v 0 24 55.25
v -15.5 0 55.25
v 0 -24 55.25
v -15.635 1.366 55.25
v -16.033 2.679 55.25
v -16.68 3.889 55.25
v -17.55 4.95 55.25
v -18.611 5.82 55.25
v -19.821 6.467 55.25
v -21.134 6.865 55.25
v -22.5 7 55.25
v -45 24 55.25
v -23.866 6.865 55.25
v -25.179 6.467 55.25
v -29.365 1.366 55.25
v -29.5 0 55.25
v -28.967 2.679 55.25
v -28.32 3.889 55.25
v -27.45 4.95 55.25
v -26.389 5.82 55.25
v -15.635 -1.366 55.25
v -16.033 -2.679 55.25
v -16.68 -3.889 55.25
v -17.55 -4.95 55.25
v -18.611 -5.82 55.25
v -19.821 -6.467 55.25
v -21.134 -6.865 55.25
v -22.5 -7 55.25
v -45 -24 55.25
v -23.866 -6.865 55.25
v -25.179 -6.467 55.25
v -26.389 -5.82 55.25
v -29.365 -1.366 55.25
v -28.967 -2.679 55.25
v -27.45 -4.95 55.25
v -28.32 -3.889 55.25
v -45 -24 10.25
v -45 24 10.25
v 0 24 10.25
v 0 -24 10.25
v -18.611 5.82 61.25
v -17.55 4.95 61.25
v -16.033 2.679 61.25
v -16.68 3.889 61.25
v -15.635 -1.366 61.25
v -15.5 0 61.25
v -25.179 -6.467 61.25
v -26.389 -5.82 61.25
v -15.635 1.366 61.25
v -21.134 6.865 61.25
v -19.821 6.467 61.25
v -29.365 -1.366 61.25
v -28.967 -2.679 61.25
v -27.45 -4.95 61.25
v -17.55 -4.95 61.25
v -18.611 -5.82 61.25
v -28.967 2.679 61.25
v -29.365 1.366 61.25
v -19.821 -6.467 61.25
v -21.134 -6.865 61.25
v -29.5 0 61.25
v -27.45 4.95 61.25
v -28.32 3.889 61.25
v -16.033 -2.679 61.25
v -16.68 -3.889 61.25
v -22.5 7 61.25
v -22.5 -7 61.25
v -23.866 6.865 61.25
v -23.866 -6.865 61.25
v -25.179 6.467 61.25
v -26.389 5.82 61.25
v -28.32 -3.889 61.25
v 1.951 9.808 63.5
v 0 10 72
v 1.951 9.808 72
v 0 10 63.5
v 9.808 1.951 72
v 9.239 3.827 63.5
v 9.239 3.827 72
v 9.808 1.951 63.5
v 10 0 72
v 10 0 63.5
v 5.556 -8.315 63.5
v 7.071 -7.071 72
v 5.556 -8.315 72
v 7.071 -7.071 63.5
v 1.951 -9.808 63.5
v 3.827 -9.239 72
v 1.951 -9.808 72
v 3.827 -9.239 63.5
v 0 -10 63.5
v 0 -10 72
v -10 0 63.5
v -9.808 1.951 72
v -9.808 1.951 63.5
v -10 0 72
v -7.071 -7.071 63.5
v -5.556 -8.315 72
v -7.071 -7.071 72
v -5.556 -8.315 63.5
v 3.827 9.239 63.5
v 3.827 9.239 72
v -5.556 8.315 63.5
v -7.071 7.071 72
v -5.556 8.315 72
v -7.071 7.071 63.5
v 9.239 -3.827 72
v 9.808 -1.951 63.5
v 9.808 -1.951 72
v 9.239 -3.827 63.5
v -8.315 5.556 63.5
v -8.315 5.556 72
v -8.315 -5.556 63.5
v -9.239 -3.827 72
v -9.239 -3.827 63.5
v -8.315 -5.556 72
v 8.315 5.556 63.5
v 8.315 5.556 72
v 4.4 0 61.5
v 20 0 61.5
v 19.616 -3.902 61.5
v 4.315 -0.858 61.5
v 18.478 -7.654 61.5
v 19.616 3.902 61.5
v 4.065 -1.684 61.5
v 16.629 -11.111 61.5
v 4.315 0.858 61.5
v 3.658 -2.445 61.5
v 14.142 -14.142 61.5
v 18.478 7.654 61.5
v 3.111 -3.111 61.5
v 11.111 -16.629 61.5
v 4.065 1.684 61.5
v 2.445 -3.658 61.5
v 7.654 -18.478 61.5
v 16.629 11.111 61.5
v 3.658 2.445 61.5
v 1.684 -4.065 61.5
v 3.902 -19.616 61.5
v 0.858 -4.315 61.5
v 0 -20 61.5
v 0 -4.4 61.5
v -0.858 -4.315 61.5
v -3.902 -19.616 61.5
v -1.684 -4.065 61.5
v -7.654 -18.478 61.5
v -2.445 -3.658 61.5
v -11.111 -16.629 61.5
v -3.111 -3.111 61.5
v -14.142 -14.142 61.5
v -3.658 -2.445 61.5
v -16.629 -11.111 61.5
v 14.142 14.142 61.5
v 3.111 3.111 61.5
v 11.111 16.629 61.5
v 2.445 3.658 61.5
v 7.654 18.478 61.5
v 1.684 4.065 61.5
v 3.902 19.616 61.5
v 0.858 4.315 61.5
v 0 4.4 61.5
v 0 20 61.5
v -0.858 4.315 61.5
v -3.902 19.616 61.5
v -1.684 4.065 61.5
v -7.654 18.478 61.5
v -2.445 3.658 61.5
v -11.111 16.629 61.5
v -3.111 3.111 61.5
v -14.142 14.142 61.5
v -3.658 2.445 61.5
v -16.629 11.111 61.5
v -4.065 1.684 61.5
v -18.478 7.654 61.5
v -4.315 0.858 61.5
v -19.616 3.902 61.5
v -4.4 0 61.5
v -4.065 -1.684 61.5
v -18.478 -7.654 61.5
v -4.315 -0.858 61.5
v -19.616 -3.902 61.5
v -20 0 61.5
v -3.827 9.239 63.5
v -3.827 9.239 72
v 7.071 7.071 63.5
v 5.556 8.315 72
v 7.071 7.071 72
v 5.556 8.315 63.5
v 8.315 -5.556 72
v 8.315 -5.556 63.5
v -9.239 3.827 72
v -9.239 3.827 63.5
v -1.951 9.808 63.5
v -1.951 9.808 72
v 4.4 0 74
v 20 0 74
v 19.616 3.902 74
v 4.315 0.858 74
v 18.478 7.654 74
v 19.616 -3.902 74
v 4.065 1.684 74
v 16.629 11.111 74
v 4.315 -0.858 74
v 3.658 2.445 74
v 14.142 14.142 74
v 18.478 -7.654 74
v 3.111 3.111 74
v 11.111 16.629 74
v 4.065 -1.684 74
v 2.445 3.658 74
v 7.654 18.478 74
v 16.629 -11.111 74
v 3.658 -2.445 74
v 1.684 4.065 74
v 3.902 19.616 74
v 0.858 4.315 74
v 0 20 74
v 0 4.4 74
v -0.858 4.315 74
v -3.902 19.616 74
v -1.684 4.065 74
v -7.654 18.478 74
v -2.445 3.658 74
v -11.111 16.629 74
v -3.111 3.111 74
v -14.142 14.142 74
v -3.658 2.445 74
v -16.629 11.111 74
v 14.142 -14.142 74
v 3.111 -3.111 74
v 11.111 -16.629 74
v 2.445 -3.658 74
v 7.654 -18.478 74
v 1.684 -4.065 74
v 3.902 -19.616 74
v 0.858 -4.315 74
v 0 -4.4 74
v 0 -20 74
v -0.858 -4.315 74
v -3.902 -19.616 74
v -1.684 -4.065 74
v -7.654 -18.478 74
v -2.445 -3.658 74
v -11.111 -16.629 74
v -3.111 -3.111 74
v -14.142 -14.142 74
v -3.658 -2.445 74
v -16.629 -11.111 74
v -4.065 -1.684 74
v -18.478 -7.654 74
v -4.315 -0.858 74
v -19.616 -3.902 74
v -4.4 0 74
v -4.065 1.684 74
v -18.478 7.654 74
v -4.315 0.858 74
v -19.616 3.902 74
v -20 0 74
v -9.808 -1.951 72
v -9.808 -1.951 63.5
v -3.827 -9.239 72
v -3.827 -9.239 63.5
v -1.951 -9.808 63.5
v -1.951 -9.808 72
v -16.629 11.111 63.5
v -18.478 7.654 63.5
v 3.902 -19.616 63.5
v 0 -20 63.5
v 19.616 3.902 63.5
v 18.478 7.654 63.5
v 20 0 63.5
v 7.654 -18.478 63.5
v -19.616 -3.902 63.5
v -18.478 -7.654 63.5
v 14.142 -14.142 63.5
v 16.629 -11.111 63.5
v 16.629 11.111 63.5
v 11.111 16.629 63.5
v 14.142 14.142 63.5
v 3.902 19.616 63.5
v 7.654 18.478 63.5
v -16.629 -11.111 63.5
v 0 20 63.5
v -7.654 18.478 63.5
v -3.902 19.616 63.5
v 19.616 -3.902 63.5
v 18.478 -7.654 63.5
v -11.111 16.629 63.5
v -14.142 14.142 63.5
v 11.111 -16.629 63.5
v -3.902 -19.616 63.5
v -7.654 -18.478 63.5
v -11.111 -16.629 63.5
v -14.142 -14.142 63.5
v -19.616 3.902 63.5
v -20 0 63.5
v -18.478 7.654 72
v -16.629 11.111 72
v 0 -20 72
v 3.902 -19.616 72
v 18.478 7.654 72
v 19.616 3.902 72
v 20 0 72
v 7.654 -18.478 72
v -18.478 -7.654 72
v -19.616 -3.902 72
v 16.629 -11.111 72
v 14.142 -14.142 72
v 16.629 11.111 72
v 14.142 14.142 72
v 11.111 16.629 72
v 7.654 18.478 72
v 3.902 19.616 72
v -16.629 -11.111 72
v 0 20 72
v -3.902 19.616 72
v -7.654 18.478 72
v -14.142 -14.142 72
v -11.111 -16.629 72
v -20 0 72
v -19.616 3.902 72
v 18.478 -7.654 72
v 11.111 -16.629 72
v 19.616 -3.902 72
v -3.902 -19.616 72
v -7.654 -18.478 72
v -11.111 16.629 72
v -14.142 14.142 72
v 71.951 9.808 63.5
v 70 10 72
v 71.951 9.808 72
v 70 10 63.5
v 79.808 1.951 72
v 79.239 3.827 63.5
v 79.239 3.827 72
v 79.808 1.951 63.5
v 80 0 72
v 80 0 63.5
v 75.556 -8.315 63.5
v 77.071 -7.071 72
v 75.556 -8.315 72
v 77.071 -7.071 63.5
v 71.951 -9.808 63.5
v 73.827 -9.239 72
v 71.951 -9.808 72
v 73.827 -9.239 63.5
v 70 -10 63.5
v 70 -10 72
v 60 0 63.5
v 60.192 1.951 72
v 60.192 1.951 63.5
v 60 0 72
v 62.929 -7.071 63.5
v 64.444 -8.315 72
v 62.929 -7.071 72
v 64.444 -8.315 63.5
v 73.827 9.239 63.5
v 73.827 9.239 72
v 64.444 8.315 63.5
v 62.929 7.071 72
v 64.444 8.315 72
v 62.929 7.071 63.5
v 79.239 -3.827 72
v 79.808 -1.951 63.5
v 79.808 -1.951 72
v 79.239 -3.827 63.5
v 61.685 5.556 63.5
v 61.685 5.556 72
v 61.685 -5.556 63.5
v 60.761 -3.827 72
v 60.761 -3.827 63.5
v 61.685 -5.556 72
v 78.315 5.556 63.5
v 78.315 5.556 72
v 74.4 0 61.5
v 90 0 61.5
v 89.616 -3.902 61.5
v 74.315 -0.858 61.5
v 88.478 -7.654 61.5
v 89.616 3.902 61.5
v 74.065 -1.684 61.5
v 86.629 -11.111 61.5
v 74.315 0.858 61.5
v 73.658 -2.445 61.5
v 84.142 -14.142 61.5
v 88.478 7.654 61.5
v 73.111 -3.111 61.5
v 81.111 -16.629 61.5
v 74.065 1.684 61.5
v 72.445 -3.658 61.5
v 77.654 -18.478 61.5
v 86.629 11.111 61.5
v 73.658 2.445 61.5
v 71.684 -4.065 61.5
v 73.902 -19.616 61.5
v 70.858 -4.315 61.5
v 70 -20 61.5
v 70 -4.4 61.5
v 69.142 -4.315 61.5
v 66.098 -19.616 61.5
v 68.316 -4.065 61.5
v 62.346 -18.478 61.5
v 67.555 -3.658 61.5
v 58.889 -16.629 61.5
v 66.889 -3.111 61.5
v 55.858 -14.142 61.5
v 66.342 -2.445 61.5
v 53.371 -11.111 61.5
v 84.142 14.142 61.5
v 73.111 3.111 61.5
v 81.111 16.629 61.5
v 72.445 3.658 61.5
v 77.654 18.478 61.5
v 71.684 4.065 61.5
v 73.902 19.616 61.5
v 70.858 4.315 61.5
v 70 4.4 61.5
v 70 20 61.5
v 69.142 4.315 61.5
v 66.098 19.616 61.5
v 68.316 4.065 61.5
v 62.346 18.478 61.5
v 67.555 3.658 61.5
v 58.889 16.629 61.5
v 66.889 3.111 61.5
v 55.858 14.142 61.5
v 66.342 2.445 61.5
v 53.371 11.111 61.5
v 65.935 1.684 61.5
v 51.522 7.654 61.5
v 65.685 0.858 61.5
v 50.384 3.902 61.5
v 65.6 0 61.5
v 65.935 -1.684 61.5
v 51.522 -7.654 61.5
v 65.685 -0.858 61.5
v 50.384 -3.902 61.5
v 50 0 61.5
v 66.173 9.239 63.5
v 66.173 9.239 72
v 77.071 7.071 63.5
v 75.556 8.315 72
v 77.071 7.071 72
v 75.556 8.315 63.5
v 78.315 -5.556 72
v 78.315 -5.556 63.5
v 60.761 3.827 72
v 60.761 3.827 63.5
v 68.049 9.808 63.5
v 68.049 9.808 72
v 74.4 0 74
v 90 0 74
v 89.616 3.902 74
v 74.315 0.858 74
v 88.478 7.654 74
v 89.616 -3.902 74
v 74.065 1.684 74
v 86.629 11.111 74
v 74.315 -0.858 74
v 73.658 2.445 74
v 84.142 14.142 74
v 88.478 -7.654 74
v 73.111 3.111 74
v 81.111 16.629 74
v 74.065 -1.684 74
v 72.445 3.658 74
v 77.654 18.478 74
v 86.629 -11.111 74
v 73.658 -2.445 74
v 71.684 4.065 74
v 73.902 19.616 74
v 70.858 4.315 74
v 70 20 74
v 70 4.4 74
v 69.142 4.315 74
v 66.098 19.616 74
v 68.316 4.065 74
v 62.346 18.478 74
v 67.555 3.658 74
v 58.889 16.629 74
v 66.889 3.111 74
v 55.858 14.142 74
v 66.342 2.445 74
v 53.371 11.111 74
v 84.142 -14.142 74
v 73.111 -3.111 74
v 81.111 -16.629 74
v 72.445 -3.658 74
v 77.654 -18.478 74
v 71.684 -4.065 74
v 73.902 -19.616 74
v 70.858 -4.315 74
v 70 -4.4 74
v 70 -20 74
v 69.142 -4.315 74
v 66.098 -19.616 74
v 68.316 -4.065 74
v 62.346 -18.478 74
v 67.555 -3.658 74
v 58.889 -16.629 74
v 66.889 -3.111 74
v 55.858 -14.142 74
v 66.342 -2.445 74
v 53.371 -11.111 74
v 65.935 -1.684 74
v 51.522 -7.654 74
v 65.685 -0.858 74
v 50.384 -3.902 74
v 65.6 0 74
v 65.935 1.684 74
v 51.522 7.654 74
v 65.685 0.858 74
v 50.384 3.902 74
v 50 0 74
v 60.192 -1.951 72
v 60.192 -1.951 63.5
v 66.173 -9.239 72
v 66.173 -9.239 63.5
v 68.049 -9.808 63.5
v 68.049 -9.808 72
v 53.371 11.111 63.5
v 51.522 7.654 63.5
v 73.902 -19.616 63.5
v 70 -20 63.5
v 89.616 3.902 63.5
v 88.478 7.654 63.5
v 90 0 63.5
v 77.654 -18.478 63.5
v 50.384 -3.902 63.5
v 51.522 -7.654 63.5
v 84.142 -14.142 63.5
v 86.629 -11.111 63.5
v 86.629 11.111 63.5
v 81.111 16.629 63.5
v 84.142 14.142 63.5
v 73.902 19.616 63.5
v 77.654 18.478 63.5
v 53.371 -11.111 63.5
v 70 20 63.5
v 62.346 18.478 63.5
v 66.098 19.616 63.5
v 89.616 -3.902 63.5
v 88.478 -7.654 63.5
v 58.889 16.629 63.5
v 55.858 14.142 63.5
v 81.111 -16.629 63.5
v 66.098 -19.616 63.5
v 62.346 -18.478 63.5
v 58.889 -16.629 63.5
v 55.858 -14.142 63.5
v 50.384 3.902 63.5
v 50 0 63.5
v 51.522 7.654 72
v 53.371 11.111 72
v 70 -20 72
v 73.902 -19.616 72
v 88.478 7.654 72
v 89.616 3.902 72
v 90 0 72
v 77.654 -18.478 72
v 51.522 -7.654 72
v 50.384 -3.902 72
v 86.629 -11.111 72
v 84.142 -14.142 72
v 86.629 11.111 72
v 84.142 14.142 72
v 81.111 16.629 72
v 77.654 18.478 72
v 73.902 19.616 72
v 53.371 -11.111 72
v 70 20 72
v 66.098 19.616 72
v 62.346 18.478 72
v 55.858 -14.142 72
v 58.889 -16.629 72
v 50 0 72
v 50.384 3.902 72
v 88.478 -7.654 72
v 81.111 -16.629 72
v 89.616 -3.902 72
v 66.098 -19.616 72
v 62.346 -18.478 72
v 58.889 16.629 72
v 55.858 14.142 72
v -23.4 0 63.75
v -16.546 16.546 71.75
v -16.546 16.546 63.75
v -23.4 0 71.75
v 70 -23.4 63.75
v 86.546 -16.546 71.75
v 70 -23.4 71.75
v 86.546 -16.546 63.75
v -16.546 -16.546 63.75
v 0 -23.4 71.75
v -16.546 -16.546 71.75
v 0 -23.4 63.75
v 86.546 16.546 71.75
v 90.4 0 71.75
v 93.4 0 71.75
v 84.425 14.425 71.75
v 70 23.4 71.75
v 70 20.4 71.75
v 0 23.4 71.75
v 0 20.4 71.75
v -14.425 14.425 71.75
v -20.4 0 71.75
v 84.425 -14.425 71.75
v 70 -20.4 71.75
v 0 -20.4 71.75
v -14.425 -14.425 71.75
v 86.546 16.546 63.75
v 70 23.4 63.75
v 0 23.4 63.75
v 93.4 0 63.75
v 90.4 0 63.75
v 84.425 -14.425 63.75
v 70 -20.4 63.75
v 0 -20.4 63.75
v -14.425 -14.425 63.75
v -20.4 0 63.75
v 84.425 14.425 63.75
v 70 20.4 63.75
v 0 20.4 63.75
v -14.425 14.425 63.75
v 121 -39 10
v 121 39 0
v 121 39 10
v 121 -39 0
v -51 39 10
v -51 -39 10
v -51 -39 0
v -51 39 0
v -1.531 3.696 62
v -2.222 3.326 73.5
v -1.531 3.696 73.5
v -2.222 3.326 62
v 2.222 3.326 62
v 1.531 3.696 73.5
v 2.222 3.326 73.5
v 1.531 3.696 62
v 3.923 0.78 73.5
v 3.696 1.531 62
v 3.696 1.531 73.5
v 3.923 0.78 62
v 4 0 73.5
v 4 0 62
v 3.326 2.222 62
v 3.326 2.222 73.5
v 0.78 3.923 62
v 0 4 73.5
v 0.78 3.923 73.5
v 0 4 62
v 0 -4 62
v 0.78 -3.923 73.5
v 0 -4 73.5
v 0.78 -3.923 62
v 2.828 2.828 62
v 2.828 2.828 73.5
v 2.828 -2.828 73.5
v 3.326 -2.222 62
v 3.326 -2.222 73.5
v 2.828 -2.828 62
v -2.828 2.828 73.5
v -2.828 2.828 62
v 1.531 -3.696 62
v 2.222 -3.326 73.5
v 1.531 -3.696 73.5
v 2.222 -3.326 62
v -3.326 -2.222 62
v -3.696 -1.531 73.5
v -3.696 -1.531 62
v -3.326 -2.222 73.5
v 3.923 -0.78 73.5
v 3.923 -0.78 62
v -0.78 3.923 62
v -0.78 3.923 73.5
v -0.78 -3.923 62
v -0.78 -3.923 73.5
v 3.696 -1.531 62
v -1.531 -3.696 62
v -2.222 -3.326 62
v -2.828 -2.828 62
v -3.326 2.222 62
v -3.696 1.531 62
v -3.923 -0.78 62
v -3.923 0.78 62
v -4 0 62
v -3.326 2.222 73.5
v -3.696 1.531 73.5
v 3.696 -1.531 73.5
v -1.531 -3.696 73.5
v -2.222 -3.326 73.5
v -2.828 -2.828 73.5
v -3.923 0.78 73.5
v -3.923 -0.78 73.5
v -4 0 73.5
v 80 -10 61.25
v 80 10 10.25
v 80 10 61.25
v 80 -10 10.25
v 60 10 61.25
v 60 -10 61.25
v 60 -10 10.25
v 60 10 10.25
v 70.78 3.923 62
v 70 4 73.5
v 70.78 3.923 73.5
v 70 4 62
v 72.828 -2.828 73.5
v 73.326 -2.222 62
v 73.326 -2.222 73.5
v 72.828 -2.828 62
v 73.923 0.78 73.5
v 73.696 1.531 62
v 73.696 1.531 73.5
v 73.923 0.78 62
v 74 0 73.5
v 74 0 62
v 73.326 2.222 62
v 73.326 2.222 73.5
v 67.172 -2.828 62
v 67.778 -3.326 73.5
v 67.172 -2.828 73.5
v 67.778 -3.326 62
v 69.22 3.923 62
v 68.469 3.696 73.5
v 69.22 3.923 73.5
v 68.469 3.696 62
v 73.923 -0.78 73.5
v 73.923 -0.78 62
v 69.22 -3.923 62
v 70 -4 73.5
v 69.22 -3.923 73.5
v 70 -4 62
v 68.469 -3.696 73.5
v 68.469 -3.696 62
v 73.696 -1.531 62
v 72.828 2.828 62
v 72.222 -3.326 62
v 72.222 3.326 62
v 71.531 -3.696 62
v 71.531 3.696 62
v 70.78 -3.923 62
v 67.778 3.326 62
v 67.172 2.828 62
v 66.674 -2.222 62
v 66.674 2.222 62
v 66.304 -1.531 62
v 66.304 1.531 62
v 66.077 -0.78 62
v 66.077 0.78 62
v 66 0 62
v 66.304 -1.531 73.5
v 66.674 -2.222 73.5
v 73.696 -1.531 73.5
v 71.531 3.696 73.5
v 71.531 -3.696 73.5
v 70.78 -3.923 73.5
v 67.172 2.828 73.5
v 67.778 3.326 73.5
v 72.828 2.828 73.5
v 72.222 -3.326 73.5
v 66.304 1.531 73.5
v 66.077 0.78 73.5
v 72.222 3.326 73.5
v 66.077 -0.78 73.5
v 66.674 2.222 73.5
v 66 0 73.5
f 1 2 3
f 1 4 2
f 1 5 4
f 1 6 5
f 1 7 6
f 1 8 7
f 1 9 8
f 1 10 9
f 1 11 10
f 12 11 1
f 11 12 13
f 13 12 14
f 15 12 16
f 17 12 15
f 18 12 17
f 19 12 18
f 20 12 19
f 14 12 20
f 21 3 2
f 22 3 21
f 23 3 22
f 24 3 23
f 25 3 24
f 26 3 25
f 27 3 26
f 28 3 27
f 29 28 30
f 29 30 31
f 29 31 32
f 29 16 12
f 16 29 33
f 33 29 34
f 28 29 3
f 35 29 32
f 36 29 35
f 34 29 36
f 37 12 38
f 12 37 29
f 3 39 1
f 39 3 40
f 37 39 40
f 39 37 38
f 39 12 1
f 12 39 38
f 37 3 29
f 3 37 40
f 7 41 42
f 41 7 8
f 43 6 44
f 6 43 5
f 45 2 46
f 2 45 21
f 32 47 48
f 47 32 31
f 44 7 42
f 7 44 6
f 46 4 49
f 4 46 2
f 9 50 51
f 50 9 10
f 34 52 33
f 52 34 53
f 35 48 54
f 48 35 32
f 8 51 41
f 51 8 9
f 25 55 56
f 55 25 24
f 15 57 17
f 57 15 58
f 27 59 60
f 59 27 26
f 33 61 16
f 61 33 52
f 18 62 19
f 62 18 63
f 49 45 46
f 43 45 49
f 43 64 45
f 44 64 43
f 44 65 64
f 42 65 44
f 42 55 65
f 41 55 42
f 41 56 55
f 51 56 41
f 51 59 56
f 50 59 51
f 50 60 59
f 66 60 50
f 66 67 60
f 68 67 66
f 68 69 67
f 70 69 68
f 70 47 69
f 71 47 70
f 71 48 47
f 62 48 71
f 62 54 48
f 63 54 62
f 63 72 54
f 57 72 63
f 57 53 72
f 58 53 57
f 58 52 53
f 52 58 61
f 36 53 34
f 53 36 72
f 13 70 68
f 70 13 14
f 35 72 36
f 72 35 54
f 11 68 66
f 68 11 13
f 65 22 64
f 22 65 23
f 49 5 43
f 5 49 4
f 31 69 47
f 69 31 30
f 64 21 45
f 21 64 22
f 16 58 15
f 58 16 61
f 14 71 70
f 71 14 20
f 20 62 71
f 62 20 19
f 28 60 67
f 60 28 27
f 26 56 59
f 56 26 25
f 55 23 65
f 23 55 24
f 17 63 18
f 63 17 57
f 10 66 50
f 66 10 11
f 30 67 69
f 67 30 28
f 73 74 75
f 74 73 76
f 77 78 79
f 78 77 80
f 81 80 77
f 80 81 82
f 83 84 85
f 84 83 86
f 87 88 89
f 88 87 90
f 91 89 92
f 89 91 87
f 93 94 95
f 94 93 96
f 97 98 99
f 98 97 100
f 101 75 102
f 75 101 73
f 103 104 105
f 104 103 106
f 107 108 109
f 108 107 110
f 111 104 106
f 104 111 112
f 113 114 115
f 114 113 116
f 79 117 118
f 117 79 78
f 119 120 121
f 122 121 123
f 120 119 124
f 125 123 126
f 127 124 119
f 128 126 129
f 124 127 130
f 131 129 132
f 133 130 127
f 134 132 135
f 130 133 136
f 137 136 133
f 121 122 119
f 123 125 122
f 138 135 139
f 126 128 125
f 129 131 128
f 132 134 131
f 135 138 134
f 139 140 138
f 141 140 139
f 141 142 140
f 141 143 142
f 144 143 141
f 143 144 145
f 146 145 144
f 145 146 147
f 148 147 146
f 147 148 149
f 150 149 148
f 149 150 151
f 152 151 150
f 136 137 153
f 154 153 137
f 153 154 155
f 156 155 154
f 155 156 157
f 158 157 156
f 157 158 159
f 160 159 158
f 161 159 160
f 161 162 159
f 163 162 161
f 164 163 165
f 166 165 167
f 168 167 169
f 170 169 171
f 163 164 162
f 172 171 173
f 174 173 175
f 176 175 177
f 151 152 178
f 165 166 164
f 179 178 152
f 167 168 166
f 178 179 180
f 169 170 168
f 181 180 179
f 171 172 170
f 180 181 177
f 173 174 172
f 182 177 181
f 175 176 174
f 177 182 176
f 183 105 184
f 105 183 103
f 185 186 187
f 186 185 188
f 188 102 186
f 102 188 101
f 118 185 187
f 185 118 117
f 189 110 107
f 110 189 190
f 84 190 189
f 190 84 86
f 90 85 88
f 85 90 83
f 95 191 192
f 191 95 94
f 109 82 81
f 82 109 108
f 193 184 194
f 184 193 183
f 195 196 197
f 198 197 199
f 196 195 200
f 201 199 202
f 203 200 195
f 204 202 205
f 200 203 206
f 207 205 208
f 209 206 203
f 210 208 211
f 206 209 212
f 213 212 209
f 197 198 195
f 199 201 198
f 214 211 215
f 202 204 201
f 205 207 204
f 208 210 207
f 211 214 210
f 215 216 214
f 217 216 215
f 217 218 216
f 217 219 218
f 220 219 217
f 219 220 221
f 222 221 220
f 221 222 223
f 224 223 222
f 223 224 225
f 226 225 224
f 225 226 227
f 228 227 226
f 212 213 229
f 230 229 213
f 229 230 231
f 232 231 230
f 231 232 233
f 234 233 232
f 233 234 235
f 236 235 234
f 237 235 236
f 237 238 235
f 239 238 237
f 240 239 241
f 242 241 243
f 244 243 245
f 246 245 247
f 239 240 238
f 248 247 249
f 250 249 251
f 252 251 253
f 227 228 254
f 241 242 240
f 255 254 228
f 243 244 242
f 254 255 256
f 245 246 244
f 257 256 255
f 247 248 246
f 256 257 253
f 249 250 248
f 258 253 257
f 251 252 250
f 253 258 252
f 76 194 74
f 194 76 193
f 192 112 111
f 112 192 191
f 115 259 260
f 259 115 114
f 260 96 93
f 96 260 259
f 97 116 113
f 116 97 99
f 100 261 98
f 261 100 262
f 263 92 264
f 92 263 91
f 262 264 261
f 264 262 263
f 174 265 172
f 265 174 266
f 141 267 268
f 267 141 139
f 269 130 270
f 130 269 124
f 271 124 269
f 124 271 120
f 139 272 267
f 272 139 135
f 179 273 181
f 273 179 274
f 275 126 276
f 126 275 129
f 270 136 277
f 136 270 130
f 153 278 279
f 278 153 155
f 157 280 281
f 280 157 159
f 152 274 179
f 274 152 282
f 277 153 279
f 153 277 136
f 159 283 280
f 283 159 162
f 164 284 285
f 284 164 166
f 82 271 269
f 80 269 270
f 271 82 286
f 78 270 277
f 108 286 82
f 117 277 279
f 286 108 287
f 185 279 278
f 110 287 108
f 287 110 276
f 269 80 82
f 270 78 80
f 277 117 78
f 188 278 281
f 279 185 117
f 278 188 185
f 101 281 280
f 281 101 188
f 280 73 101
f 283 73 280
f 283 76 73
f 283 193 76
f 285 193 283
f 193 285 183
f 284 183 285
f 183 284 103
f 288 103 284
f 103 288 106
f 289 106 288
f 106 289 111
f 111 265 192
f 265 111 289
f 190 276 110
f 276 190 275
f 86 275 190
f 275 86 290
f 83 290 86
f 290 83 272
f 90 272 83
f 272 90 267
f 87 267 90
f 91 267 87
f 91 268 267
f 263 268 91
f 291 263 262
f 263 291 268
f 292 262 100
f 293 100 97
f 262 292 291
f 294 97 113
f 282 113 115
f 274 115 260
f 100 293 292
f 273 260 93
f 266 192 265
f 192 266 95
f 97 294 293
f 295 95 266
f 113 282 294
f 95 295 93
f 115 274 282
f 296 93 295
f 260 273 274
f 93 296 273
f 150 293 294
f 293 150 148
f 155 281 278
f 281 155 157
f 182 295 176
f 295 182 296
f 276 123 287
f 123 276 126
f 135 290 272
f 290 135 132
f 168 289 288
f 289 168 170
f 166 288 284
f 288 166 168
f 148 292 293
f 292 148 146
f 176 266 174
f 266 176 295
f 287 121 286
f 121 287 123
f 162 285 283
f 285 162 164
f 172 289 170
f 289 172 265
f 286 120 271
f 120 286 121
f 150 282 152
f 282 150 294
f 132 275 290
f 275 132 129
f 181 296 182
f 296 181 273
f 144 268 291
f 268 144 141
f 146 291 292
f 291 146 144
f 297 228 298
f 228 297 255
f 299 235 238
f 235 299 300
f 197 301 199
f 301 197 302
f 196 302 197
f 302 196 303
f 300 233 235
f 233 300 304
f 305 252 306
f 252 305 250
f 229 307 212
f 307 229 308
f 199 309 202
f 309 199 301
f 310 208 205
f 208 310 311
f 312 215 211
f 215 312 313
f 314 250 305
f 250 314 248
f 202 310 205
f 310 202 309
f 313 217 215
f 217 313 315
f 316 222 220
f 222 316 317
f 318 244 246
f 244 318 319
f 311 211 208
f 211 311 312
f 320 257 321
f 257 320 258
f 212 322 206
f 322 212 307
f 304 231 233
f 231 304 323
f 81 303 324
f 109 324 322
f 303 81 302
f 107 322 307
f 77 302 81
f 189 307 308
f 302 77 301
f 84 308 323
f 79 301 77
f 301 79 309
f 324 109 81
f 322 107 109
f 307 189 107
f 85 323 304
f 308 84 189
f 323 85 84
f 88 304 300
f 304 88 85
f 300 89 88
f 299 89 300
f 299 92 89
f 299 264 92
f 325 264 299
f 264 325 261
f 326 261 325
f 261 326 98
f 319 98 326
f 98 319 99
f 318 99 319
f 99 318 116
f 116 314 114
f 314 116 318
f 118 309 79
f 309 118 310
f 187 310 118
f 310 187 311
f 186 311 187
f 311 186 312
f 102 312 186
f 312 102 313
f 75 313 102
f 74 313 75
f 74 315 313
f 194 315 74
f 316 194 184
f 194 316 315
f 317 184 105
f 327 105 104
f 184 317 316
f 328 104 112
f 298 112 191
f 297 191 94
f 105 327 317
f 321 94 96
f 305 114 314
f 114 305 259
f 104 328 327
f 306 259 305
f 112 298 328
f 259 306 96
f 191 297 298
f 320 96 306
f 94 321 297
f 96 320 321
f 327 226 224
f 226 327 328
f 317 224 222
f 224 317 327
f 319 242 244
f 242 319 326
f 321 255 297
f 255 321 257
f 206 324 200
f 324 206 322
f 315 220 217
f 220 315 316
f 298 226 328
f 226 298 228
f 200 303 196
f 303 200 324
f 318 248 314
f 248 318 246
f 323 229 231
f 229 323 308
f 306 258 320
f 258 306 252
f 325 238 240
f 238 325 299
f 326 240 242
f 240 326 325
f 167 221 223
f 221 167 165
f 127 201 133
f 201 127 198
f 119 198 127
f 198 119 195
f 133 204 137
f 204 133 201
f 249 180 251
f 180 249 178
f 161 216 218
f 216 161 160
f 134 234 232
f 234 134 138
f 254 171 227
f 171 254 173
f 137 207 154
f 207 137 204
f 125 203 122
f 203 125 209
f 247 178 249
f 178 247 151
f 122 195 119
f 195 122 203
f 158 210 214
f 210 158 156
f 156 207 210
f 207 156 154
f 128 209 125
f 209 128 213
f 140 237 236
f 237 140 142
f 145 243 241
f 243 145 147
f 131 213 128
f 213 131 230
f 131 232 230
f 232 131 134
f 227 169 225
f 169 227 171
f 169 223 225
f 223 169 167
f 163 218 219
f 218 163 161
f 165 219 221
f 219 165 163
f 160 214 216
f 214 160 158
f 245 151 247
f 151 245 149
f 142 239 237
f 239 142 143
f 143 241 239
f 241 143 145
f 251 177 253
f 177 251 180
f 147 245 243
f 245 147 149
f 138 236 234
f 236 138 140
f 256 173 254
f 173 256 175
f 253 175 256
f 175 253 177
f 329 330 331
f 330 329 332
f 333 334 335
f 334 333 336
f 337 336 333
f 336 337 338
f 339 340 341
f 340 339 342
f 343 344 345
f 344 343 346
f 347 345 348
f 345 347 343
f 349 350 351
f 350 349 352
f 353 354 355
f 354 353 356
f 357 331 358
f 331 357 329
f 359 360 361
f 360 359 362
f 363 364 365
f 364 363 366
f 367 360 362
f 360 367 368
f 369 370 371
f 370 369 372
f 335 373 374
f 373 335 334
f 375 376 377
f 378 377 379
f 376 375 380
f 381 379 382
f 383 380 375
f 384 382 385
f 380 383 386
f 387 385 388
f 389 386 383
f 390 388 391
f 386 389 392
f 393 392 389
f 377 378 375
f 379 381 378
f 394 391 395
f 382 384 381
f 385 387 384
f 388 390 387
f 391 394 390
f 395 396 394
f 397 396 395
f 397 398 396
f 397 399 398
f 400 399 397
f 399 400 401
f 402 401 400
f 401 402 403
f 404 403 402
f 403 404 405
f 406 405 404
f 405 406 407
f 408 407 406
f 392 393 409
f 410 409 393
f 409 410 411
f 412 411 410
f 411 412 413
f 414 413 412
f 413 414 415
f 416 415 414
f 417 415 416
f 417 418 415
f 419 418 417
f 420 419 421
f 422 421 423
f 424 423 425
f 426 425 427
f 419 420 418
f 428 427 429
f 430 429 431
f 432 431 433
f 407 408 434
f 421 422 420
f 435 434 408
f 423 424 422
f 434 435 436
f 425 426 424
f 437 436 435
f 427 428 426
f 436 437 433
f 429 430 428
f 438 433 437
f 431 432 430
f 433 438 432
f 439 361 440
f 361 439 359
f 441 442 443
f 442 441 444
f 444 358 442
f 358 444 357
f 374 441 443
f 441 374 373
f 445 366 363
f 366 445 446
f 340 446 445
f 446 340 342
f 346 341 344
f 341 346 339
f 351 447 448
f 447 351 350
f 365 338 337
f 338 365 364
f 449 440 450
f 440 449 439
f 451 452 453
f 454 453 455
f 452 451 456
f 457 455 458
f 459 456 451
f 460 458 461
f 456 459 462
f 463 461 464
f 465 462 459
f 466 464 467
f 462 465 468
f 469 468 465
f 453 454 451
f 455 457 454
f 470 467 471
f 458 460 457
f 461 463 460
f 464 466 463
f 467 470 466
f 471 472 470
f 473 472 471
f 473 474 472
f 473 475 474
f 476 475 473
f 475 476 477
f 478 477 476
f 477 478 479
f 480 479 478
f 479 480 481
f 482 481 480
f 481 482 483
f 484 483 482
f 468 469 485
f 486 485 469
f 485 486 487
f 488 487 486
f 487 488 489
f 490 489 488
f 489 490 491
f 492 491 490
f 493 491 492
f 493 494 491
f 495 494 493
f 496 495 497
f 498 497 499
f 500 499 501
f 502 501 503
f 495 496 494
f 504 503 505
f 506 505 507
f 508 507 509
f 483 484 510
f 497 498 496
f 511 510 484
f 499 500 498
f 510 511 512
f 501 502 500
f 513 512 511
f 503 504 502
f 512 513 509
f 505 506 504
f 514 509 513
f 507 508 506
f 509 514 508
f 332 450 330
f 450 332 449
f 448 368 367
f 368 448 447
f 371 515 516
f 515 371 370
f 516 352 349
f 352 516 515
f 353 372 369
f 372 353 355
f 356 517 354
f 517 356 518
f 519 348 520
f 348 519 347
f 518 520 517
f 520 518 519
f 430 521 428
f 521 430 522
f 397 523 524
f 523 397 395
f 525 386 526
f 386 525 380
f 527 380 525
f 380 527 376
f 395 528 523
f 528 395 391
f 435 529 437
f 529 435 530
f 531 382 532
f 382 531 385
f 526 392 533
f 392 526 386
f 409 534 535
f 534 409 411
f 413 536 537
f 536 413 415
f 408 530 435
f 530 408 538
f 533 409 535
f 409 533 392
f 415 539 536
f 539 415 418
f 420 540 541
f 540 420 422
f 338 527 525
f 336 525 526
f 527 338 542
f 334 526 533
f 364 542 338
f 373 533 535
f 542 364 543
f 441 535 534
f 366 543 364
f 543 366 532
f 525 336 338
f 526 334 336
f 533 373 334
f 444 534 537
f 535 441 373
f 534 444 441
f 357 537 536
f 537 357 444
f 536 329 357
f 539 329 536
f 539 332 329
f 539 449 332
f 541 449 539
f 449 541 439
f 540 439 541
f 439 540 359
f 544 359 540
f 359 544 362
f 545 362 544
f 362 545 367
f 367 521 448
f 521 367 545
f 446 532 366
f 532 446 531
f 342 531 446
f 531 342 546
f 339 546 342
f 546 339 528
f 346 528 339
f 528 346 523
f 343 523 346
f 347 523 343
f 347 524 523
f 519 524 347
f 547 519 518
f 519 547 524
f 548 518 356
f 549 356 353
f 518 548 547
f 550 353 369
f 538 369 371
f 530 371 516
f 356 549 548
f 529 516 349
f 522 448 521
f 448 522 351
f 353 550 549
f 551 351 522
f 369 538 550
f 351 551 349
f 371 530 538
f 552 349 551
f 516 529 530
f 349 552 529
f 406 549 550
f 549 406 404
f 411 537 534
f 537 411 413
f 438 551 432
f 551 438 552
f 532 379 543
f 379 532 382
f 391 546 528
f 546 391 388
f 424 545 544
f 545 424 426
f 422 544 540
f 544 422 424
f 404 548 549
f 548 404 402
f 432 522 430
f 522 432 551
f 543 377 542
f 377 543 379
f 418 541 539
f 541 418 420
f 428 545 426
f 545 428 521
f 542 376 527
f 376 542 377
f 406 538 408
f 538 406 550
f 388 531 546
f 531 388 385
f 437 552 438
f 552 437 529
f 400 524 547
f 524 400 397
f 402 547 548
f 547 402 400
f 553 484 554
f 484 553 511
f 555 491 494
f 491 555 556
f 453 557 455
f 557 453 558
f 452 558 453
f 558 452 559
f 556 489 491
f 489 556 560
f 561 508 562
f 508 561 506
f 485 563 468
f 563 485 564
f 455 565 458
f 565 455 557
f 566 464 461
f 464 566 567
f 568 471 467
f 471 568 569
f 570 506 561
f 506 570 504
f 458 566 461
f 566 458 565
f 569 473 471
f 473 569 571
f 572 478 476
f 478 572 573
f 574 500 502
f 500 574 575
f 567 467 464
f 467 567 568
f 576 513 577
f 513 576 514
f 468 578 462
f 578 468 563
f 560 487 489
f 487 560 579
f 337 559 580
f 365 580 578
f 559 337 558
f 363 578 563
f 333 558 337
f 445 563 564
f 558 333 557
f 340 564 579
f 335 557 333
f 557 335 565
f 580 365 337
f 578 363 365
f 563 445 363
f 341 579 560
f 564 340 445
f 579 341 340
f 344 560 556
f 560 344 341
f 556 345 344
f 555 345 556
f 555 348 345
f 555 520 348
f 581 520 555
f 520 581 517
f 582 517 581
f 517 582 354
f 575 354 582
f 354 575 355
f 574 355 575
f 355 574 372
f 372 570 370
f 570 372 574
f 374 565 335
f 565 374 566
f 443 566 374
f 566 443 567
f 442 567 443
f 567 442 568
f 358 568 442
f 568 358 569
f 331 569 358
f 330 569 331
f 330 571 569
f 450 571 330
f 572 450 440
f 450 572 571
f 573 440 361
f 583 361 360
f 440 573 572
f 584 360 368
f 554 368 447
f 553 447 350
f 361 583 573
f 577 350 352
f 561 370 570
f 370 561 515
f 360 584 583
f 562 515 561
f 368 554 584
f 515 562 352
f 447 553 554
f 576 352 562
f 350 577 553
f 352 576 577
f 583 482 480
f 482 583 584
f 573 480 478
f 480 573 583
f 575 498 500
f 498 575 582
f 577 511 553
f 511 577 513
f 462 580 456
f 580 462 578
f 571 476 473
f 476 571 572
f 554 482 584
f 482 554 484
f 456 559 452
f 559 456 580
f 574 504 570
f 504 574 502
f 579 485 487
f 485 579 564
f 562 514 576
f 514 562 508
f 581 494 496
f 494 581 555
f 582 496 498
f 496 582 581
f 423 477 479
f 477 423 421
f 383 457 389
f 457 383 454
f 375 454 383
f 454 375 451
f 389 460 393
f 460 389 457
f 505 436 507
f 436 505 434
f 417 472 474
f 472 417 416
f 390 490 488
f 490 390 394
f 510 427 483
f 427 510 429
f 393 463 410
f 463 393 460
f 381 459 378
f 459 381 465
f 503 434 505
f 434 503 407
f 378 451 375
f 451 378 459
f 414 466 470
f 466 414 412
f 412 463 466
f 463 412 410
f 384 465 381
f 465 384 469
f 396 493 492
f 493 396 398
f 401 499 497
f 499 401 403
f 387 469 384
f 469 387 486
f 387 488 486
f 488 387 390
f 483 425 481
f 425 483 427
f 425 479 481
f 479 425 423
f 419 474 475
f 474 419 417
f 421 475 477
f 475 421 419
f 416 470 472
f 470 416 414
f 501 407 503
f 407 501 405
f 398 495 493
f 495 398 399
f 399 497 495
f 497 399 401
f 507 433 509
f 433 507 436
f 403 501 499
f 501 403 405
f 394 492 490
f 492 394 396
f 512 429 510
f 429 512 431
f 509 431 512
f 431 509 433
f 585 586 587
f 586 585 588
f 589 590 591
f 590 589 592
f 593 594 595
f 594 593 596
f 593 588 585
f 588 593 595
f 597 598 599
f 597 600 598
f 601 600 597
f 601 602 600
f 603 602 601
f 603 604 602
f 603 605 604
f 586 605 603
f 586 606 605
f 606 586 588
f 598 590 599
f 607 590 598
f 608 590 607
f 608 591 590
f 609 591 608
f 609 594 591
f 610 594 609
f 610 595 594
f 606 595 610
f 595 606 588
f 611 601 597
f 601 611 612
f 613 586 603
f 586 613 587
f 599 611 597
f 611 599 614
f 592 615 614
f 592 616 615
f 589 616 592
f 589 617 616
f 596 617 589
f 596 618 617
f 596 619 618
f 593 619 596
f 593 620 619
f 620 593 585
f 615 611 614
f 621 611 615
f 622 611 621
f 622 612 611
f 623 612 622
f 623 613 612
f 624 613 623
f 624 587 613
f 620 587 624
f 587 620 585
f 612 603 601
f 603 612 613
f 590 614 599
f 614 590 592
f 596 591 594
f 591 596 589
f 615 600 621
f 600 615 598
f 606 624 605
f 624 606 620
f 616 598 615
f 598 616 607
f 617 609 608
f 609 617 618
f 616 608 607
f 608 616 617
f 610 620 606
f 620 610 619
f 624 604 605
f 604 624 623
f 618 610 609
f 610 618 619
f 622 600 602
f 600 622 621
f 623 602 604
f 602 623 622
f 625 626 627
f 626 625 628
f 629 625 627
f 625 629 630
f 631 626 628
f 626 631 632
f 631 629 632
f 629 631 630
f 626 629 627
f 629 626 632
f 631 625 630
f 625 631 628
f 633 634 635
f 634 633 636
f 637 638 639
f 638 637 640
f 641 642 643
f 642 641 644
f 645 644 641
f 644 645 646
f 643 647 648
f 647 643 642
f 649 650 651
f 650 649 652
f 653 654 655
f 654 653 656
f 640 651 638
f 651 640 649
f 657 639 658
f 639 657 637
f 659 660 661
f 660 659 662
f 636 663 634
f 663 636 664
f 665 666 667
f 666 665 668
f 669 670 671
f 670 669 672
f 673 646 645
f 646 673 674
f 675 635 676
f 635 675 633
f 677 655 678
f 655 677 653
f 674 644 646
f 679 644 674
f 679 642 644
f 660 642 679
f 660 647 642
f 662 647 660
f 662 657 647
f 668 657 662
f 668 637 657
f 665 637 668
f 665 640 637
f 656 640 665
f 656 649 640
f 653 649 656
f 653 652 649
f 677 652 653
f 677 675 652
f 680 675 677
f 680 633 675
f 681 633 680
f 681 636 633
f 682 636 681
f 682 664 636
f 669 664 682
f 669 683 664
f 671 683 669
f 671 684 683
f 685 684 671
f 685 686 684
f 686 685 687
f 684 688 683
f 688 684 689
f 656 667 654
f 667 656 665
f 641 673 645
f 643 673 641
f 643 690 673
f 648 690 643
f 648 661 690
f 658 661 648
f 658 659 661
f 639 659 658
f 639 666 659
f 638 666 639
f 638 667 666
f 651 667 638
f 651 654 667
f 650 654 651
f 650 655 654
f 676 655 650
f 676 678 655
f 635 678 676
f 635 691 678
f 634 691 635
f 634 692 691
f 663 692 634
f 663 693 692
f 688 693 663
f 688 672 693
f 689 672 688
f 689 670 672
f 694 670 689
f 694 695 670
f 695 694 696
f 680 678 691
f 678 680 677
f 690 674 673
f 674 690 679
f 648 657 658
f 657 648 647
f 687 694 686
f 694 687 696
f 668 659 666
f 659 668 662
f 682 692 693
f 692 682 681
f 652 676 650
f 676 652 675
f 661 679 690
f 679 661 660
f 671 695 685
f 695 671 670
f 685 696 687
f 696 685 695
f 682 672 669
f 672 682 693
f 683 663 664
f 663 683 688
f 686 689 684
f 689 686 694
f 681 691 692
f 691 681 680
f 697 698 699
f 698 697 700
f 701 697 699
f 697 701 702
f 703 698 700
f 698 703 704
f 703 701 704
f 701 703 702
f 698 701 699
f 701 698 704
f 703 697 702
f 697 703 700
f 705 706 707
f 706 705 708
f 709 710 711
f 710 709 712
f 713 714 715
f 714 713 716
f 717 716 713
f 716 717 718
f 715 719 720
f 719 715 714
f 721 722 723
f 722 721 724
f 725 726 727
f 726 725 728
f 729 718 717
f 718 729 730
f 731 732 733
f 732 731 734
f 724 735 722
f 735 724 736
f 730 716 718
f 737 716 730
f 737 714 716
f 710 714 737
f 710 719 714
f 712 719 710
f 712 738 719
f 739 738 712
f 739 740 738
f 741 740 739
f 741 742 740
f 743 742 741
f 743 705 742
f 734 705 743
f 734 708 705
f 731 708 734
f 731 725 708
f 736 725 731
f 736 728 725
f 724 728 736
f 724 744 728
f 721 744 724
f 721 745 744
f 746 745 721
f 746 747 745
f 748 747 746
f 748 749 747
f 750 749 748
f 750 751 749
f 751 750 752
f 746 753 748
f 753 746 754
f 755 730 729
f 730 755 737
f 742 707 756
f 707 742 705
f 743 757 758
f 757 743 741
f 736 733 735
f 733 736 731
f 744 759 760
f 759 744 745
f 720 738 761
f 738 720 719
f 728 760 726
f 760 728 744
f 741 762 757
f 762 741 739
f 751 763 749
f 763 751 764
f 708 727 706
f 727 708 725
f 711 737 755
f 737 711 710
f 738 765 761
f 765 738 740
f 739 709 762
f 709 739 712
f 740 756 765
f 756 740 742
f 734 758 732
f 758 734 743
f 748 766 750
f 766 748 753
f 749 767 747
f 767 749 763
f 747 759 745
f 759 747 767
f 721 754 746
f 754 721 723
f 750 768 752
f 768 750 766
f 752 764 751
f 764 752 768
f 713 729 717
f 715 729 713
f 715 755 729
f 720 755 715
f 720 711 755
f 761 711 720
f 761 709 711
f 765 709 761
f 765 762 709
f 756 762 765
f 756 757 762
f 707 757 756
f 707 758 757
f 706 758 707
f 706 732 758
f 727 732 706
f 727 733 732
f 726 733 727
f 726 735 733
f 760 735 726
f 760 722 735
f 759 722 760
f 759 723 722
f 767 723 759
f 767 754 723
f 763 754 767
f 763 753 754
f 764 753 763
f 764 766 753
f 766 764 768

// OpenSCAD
$fn = 32;

// ------------------------------------------------------------------------
// Motor belt drive: span 70 mm, pulleys d40, belt 8 mm wide
// Every part is its own module, assembly() places every instance.
// ------------------------------------------------------------------------

// --- part 1 ---
module base_plate() {
  difference() {
    translate([-86, -39, 0]) cube([172, 78, 10]);
  }
}

// --- part 2 ---
module motor() {
  union() {
    translate([-22.5, -24, 0]) cube([45, 48, 45]);
    translate([25.5, 0, 22.5]) rotate([0, 90, 0]) cylinder(h = 6, d = 14, center = true);
  }
}

// --- part 3 ---
module drive_shaft() {
  translate([0, 0, -5.75]) cylinder(h = 11.5, d = 8);
}

// --- part 4 ---
module pulley_drive() {
  difference() {
    union() {
      cylinder(h = 12.5, d = 20);
      cylinder(h = 2, d = 40);
      translate([0, 0, 10.5]) cylinder(h = 2, d = 40);
    }
    translate([0, 0, -1]) cylinder(h = 14.5, d = 8.8);
  }
}

// --- part 5 ---
module idler_post() {
  translate([-10, -10, 0]) cube([20, 20, 51]);
}

// --- part 6 ---
module driven_shaft() {
  translate([0, 0, -5.75]) cylinder(h = 11.5, d = 8);
}

// --- part 7 ---
module pulley_driven() {
  difference() {
    union() {
      cylinder(h = 12.5, d = 20);
      cylinder(h = 2, d = 40);
      translate([0, 0, 10.5]) cylinder(h = 2, d = 40);
    }
    translate([0, 0, -1]) cylinder(h = 14.5, d = 8.8);
  }
}

// --- part 8 ---
module drive_belt() {
  difference() {
    linear_extrude(height = 8) polygon(points = concat([for (a = [90 : 45 : 270]) [23.4 * cos(a), 23.4 * sin(a)]], [for (a = [270 : 45 : 450]) [70 + 23.4 * cos(a), 23.4 * sin(a)]]));
    translate([0, 0, -1]) linear_extrude(height = 10) polygon(points = concat([for (a = [90 : 45 : 270]) [20.4 * cos(a), 20.4 * sin(a)]], [for (a = [270 : 45 : 450]) [70 + 20.4 * cos(a), 20.4 * sin(a)]]));
  }
}

// --- assembly ---
module assembly() {
  color([0.80, 0.24, 0.20]) translate([35, 0, 0]) rotate([0, 0, 0]) base_plate();
  color([0.20, 0.45, 0.75]) translate([0, 0, 32.75]) rotate([0, 270, 0]) motor();
  color([0.25, 0.62, 0.32]) translate([0, 0, 67.75]) rotate([0, 0, 0]) drive_shaft();
  color([0.92, 0.70, 0.18]) translate([0, 0, 61.5]) rotate([0, 0, 0]) pulley_drive();
  color([0.58, 0.35, 0.70]) translate([70, 0, 10.25]) rotate([0, 0, 0]) idler_post();
  color([0.16, 0.66, 0.66]) translate([70, 0, 67.75]) rotate([0, 0, 0]) driven_shaft();
  color([0.85, 0.48, 0.18]) translate([70, 0, 61.5]) rotate([0, 0, 0]) pulley_driven();
  color([0.55, 0.60, 0.65]) translate([0, 0, 63.75]) rotate([0, 0, 0]) drive_belt();
}

assembly();
